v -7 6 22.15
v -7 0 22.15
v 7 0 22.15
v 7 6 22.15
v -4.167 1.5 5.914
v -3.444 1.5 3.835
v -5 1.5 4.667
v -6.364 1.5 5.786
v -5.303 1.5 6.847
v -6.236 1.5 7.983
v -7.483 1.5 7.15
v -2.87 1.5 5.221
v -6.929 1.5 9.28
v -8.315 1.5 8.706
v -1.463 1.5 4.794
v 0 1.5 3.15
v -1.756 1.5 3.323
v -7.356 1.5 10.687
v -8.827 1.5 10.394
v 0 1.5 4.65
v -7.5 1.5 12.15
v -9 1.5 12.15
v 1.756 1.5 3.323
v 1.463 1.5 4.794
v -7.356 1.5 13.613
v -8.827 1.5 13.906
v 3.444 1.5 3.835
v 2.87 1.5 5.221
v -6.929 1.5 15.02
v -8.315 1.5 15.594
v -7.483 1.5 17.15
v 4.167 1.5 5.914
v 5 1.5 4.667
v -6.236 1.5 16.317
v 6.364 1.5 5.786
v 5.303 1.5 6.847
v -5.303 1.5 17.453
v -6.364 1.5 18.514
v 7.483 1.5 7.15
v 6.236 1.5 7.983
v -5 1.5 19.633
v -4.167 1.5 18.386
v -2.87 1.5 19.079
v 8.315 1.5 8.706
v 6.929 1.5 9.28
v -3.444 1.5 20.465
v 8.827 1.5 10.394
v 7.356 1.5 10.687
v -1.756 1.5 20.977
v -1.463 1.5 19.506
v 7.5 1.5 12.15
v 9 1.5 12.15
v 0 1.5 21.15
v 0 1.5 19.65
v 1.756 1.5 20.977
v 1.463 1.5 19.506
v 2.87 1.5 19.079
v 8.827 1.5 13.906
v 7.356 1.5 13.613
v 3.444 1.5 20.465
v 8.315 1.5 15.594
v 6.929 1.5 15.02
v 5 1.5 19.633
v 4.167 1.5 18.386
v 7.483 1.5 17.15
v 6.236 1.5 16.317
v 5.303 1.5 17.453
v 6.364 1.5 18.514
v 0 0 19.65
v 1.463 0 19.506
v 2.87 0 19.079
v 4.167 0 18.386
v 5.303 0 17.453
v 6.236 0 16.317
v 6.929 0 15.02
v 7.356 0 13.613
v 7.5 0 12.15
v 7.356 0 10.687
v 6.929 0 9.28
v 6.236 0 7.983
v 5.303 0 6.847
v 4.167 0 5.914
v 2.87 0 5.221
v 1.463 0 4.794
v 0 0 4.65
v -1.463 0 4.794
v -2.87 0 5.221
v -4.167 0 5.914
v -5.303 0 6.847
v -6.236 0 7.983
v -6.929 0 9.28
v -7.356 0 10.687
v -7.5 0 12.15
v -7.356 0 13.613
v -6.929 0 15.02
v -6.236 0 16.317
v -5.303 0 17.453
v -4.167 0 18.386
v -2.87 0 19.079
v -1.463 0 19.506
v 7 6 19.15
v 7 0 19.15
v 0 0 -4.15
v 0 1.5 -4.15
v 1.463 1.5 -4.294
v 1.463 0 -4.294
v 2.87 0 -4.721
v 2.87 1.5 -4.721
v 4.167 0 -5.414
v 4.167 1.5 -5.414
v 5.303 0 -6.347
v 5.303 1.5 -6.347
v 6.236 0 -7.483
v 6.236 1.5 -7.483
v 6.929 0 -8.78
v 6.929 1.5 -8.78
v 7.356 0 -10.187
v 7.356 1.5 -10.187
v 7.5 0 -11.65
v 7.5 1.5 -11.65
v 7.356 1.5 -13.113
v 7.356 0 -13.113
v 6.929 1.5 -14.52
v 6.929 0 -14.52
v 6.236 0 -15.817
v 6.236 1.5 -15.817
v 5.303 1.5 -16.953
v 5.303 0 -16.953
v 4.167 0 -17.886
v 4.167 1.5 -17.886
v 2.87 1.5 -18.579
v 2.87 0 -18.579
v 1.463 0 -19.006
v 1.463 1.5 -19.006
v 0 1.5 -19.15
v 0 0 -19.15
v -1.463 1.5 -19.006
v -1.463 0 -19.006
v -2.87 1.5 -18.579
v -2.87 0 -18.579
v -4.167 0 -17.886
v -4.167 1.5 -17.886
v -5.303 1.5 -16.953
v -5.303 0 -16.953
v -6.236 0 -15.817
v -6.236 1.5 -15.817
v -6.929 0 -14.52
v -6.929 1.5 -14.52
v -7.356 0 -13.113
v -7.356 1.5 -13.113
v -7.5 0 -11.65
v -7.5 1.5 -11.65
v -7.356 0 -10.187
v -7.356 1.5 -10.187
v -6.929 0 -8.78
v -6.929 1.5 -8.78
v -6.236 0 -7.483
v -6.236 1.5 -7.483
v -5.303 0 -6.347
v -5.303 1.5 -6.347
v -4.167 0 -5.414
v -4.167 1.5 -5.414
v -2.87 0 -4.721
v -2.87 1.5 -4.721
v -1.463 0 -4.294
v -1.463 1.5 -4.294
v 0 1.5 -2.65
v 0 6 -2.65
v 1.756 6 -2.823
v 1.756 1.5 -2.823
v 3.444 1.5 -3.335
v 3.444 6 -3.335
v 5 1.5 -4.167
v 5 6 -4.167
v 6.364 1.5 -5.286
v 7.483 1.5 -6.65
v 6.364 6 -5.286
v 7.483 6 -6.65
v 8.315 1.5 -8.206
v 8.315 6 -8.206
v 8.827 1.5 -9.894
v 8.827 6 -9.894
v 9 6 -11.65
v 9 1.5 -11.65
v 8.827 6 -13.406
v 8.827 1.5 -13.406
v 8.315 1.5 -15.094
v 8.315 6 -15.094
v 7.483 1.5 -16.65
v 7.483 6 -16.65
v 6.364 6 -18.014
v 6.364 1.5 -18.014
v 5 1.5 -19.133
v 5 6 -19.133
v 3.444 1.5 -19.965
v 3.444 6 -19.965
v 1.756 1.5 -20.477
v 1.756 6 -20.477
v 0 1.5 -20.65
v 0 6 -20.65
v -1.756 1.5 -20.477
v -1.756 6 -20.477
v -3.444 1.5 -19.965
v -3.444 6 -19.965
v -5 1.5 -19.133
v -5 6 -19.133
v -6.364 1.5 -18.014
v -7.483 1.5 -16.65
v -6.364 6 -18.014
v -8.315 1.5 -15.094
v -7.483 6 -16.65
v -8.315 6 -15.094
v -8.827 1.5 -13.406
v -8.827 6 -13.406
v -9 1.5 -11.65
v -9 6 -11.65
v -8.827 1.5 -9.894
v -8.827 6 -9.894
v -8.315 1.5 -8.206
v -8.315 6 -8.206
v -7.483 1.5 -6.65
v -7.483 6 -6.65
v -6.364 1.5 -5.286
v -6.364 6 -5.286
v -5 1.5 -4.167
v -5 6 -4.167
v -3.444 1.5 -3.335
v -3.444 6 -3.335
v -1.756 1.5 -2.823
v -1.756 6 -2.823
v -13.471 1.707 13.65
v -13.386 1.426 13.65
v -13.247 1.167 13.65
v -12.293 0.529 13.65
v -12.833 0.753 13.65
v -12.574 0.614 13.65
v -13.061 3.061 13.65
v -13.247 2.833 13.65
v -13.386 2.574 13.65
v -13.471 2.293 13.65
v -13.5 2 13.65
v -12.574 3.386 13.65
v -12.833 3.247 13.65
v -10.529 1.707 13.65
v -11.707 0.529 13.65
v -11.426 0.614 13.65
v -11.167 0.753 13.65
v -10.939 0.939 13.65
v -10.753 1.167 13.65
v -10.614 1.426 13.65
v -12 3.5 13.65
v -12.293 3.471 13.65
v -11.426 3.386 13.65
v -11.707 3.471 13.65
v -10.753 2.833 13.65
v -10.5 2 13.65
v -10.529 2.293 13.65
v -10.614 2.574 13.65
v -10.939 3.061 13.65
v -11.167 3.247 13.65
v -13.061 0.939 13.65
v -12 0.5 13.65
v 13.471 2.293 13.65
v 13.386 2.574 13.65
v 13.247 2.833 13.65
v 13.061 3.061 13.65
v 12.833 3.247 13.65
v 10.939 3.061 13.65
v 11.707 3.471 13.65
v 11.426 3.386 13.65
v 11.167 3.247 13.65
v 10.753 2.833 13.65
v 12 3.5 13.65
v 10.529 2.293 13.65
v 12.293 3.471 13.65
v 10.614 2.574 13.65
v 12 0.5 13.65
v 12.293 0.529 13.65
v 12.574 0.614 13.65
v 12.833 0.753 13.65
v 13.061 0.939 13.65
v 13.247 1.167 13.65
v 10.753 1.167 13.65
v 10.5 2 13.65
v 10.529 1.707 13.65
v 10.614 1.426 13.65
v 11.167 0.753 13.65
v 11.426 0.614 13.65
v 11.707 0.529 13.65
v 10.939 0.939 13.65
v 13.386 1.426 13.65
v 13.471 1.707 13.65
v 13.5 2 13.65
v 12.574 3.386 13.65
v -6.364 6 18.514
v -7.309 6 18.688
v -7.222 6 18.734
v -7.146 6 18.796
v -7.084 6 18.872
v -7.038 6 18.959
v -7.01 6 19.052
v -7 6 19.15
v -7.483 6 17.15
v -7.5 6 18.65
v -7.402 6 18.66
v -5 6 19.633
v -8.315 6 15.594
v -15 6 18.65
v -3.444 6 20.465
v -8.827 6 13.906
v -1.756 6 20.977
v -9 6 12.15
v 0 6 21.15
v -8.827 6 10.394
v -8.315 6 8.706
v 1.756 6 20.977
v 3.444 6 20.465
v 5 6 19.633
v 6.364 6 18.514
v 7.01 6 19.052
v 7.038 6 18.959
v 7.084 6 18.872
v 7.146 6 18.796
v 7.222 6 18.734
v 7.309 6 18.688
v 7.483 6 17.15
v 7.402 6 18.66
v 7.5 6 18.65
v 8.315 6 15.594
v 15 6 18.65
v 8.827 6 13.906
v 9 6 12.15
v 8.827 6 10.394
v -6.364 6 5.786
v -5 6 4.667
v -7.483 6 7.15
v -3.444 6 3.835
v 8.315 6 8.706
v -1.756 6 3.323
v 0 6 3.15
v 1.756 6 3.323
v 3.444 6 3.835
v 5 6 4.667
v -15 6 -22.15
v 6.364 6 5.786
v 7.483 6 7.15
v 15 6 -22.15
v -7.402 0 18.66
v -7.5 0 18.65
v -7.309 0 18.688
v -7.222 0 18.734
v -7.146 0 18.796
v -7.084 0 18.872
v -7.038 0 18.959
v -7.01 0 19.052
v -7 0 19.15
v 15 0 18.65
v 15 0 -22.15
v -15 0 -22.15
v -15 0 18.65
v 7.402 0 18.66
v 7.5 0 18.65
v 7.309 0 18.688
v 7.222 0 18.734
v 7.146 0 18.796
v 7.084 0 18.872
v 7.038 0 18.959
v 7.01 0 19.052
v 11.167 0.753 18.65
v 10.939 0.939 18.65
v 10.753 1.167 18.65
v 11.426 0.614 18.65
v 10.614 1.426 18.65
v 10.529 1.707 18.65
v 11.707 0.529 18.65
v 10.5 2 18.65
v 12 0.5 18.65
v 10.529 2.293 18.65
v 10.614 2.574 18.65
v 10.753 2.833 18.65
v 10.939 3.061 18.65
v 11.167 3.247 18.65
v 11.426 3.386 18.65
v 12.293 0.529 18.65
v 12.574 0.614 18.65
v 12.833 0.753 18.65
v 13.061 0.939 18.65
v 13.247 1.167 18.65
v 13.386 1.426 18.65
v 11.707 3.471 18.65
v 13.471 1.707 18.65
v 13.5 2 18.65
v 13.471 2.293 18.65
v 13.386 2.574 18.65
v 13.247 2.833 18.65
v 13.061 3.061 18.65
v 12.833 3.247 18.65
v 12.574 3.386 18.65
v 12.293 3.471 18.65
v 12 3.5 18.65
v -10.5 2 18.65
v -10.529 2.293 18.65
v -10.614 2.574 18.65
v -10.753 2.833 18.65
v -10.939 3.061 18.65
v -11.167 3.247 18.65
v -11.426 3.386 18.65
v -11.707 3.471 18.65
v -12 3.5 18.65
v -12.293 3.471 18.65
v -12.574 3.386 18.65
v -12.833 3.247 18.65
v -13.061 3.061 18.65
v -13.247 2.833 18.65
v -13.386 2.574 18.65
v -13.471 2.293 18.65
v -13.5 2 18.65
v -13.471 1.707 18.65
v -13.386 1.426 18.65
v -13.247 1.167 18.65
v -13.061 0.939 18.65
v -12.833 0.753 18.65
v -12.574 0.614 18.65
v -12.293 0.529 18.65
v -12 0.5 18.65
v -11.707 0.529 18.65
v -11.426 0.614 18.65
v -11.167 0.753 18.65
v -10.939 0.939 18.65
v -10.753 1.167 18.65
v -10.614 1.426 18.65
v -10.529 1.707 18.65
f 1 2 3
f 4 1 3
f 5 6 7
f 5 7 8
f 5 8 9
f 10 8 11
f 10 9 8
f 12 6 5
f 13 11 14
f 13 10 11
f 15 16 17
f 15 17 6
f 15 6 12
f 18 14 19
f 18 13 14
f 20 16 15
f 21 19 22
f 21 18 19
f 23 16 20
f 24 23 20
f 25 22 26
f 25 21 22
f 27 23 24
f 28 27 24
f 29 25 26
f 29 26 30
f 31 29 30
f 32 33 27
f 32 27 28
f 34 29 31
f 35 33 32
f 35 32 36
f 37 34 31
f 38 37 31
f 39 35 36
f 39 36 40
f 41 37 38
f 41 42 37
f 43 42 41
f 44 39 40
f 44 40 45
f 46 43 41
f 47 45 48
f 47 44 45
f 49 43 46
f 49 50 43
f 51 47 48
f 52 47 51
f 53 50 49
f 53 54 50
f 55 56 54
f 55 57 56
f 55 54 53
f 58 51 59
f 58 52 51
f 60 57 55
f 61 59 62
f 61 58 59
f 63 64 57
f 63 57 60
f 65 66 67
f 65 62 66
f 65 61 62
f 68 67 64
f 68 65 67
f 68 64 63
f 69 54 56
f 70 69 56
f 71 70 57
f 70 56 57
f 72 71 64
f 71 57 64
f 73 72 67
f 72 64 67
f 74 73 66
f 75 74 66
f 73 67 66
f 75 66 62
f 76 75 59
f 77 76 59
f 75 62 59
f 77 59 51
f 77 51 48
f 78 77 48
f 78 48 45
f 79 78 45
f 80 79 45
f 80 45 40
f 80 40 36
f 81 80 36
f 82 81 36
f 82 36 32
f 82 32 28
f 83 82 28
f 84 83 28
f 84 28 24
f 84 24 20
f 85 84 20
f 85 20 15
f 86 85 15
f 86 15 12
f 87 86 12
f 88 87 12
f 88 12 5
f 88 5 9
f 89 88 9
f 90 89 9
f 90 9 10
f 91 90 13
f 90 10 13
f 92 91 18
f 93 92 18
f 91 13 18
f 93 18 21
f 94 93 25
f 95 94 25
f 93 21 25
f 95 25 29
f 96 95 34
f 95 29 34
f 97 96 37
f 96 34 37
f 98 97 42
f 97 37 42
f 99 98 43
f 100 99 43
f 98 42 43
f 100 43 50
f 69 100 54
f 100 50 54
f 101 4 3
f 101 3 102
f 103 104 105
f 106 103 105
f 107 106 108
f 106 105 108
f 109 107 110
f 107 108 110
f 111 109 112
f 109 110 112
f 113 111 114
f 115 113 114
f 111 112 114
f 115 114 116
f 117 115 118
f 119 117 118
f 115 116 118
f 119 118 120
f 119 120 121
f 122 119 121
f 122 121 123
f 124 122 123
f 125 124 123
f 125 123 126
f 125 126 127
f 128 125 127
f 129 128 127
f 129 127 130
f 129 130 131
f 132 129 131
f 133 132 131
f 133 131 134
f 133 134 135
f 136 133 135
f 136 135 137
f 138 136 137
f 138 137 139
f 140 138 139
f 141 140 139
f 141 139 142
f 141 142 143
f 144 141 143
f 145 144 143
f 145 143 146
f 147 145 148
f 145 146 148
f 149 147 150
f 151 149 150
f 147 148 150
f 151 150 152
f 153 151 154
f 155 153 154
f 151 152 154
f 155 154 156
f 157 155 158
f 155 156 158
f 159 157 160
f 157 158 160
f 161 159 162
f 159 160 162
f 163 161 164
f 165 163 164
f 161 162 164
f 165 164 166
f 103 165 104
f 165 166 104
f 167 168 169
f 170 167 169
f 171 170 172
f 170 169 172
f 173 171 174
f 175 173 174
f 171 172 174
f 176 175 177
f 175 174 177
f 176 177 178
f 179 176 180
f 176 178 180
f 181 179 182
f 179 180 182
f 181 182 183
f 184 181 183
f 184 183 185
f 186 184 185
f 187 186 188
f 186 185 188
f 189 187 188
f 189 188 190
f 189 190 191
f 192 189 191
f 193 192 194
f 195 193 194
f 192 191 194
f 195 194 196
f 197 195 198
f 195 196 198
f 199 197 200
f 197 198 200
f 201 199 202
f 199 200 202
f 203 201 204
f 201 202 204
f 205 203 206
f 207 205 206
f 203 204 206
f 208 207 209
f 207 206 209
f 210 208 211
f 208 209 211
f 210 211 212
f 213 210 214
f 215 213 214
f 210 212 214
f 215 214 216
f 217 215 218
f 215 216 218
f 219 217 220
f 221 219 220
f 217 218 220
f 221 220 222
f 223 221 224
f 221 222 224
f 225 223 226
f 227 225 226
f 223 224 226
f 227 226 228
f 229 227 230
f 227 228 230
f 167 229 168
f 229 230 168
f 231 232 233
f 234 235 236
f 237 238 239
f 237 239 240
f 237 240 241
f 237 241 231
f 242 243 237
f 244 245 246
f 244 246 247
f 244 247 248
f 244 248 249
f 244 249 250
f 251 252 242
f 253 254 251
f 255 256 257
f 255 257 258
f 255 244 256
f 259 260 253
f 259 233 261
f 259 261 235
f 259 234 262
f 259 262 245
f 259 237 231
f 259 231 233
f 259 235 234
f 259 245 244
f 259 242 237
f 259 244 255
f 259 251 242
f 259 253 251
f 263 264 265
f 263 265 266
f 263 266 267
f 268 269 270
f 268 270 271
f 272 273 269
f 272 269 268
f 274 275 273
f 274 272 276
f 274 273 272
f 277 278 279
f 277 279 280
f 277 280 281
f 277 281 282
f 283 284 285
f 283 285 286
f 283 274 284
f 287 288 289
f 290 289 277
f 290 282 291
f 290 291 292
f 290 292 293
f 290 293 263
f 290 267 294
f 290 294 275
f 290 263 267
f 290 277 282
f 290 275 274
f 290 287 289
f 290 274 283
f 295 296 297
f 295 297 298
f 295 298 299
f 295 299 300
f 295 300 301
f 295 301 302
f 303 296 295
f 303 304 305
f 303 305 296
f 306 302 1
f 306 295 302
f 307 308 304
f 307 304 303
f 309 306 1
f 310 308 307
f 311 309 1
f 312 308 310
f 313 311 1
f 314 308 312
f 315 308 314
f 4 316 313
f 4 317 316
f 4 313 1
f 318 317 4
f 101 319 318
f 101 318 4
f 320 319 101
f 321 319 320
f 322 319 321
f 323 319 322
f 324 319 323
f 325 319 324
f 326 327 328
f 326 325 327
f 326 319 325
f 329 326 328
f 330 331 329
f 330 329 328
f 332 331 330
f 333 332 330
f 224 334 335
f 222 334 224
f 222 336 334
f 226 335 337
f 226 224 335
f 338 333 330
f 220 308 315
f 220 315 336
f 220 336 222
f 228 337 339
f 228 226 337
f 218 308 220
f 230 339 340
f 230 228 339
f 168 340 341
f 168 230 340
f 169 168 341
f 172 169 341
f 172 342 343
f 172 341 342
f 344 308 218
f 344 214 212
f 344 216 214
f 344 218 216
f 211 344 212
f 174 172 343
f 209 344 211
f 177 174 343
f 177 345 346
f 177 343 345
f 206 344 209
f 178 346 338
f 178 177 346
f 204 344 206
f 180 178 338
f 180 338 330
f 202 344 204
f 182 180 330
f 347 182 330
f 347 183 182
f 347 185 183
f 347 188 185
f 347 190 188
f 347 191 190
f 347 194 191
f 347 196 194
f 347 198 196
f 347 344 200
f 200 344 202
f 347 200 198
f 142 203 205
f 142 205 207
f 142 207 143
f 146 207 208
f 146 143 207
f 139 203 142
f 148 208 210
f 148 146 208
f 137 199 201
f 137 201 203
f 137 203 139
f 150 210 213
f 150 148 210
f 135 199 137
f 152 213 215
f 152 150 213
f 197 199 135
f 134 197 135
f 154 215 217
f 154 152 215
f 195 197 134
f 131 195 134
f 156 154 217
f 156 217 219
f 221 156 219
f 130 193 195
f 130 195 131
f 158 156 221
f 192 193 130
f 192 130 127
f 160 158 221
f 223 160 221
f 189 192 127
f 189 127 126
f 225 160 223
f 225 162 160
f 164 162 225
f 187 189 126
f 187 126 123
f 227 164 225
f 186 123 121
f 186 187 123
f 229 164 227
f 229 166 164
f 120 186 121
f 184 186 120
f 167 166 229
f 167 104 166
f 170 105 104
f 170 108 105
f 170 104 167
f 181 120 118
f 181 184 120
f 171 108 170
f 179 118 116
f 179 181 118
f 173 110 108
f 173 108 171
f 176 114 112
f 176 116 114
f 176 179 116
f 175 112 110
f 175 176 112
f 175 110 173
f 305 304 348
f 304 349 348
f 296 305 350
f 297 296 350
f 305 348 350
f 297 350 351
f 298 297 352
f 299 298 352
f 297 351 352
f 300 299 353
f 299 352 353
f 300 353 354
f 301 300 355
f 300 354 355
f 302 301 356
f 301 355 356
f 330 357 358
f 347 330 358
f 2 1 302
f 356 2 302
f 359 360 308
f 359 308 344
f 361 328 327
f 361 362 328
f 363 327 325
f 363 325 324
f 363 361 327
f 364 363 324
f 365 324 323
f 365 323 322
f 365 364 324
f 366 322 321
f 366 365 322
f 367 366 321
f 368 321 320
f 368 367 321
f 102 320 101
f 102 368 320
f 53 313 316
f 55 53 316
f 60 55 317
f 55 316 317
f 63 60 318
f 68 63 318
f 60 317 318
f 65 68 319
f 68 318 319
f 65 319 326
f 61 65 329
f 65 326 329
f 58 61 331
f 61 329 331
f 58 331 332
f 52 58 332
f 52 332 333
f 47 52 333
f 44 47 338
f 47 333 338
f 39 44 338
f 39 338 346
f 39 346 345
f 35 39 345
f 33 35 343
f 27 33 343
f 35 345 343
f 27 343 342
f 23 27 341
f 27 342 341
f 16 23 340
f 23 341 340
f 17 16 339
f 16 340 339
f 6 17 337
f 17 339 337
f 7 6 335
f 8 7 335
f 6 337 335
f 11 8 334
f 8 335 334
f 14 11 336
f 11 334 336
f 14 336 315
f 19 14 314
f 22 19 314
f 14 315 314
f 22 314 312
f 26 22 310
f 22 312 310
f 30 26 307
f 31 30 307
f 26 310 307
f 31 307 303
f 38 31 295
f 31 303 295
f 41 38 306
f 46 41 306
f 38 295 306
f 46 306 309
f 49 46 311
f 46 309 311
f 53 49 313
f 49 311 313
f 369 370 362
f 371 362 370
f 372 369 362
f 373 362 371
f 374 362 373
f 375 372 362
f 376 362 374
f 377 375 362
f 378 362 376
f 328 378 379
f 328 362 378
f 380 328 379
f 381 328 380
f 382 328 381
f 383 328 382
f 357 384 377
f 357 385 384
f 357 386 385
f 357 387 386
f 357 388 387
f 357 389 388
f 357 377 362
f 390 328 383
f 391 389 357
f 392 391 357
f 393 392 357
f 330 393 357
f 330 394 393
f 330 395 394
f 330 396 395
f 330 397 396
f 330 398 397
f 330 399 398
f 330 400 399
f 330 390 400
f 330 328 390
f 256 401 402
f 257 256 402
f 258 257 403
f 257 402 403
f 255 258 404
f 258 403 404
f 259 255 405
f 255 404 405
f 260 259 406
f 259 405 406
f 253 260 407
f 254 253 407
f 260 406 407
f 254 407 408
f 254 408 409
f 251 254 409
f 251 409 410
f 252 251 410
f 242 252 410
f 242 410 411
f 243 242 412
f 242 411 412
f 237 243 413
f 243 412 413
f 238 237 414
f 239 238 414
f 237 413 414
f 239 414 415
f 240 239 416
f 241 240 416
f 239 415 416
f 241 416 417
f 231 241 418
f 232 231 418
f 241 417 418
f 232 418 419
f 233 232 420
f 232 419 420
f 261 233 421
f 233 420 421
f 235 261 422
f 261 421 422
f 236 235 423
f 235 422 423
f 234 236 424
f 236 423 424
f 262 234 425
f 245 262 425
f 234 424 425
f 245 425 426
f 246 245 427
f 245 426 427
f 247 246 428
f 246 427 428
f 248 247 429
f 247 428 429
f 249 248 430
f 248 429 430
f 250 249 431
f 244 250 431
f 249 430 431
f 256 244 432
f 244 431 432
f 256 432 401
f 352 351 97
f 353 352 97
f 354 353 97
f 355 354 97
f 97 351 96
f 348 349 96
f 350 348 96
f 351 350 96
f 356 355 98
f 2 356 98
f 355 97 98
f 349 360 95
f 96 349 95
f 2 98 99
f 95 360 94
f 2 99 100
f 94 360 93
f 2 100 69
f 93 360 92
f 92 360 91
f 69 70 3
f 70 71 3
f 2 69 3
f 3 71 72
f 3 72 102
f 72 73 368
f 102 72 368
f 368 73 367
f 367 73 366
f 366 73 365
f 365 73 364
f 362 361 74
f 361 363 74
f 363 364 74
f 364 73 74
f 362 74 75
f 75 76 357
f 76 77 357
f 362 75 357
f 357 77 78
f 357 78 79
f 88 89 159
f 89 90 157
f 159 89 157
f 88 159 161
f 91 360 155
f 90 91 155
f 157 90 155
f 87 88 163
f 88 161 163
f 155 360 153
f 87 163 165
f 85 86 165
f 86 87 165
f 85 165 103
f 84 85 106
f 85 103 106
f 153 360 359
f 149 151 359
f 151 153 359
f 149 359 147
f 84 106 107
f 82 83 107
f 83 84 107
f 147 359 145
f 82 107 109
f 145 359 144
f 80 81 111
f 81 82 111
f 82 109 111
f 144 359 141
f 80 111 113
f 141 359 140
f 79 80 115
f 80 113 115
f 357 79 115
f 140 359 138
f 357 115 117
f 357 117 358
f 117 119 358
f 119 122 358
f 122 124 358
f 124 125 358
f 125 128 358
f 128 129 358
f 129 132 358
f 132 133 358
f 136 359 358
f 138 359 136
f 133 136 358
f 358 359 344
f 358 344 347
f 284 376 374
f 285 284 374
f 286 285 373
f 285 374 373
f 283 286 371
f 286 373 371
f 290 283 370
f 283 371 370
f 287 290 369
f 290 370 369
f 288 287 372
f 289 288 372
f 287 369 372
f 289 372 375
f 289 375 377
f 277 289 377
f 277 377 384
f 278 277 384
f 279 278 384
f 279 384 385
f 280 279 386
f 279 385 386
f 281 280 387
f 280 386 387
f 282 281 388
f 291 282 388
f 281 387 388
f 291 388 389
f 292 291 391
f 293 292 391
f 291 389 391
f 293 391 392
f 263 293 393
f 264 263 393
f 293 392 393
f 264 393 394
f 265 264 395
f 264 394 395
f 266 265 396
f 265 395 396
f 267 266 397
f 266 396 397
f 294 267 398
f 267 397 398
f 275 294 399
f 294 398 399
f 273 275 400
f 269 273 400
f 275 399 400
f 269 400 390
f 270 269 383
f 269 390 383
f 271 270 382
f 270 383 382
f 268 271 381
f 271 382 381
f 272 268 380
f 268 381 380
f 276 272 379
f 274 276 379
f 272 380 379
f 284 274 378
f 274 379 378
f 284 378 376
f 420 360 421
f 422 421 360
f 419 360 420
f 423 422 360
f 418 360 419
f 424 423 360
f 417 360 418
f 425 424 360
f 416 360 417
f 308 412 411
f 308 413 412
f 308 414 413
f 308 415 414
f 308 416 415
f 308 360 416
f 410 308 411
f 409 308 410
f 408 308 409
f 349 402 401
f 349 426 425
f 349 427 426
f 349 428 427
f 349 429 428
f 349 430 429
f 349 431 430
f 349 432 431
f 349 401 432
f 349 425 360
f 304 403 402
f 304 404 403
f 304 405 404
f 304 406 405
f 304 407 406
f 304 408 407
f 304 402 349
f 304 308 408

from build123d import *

# Parameters (mm, degrees)
SKETCH_1_W             = 30
SKETCH_1_H             = 44.3
EXTRUDE_1_DEPTH        = 6
SKETCH_2_R             = 9
CUT_EXTRUDE_1_DEPTH    = 4.5
SKETCH_3_R             = 7.5
CUT_EXTRUDE_2_DEPTH    = 4.5
SKETCH_5_W             = 8
SKETCH_5_H             = 3.5
CUT_EXTRUDE_3_DEPTH    = 10
FILLET_1_R             = 0.5
SKETCH_6_R             = 1.5
CUT_EXTRUDE_1251_DEPTH = 5


with BuildPart() as part:
    # 草图1 → 凸台-拉伸1 (new body)
    with BuildSketch(Plane(origin=(0, 0, 0), x_dir=(1, 0, 0), z_dir=(0, 1, 0))):
        Rectangle(SKETCH_1_W, SKETCH_1_H)
    extrude(amount=EXTRUDE_1_DEPTH)

    # 草图2 → 切除-拉伸1 (cut)
    with BuildSketch(Plane(origin=(0, 6, 0), x_dir=(1, 0, 0), z_dir=(0, 1, 0))):
        with Locations(Location((0, 11.65, 0), (0, 0, 270))):
            Circle(SKETCH_2_R)
        with Locations(Location((0, -12.15, 0), (0, 0, 270))):
            Circle(SKETCH_2_R)
    extrude(amount=-CUT_EXTRUDE_1_DEPTH, mode=Mode.SUBTRACT)

    # 草图3 → 切除-拉伸2 (cut)
    with BuildSketch(Plane(origin=(0, 1.5, 0), x_dir=(1, 0, 0), z_dir=(0, 1, 0))):
        with Locations(Location((0, 11.65, 0), (0, 0, 270))):
            Circle(SKETCH_3_R)
        with Locations(Location((0, -12.15, 0), (0, 0, 270))):
            Circle(SKETCH_3_R)
    extrude(amount=-CUT_EXTRUDE_2_DEPTH, mode=Mode.SUBTRACT)

    # 草图5 → 切除-拉伸3 (cut)
    with BuildSketch(Plane(origin=(0, 6, 0), x_dir=(1, 0, 0), z_dir=(0, 1, 0))):
        with Locations((11, -20.4)):
            Rectangle(SKETCH_5_W, SKETCH_5_H)
        with Locations((-11, -20.4)):
            Rectangle(SKETCH_5_W, SKETCH_5_H)
    extrude(amount=-CUT_EXTRUDE_3_DEPTH, mode=Mode.SUBTRACT)

    # 圆角1
    fillet_1_edges = [part.edges().sort_by_distance(p)[0] for p in [
        (-7, 3, 18.65),
        (7, 3, 18.65),
    ]]
    fillet(fillet_1_edges, radius=FILLET_1_R)

    # 草图6 → Cut-Extrude 1251 (cut)
    with BuildSketch(Plane.XY.offset(18.65)):
        with Locations((-12, 2)):
            Circle(SKETCH_6_R)
        with Locations(Location((12, 2, 0), (0, 0, 180))):
            Circle(SKETCH_6_R)
    extrude(amount=-CUT_EXTRUDE_1251_DEPTH, mode=Mode.SUBTRACT)


solid = part.part
